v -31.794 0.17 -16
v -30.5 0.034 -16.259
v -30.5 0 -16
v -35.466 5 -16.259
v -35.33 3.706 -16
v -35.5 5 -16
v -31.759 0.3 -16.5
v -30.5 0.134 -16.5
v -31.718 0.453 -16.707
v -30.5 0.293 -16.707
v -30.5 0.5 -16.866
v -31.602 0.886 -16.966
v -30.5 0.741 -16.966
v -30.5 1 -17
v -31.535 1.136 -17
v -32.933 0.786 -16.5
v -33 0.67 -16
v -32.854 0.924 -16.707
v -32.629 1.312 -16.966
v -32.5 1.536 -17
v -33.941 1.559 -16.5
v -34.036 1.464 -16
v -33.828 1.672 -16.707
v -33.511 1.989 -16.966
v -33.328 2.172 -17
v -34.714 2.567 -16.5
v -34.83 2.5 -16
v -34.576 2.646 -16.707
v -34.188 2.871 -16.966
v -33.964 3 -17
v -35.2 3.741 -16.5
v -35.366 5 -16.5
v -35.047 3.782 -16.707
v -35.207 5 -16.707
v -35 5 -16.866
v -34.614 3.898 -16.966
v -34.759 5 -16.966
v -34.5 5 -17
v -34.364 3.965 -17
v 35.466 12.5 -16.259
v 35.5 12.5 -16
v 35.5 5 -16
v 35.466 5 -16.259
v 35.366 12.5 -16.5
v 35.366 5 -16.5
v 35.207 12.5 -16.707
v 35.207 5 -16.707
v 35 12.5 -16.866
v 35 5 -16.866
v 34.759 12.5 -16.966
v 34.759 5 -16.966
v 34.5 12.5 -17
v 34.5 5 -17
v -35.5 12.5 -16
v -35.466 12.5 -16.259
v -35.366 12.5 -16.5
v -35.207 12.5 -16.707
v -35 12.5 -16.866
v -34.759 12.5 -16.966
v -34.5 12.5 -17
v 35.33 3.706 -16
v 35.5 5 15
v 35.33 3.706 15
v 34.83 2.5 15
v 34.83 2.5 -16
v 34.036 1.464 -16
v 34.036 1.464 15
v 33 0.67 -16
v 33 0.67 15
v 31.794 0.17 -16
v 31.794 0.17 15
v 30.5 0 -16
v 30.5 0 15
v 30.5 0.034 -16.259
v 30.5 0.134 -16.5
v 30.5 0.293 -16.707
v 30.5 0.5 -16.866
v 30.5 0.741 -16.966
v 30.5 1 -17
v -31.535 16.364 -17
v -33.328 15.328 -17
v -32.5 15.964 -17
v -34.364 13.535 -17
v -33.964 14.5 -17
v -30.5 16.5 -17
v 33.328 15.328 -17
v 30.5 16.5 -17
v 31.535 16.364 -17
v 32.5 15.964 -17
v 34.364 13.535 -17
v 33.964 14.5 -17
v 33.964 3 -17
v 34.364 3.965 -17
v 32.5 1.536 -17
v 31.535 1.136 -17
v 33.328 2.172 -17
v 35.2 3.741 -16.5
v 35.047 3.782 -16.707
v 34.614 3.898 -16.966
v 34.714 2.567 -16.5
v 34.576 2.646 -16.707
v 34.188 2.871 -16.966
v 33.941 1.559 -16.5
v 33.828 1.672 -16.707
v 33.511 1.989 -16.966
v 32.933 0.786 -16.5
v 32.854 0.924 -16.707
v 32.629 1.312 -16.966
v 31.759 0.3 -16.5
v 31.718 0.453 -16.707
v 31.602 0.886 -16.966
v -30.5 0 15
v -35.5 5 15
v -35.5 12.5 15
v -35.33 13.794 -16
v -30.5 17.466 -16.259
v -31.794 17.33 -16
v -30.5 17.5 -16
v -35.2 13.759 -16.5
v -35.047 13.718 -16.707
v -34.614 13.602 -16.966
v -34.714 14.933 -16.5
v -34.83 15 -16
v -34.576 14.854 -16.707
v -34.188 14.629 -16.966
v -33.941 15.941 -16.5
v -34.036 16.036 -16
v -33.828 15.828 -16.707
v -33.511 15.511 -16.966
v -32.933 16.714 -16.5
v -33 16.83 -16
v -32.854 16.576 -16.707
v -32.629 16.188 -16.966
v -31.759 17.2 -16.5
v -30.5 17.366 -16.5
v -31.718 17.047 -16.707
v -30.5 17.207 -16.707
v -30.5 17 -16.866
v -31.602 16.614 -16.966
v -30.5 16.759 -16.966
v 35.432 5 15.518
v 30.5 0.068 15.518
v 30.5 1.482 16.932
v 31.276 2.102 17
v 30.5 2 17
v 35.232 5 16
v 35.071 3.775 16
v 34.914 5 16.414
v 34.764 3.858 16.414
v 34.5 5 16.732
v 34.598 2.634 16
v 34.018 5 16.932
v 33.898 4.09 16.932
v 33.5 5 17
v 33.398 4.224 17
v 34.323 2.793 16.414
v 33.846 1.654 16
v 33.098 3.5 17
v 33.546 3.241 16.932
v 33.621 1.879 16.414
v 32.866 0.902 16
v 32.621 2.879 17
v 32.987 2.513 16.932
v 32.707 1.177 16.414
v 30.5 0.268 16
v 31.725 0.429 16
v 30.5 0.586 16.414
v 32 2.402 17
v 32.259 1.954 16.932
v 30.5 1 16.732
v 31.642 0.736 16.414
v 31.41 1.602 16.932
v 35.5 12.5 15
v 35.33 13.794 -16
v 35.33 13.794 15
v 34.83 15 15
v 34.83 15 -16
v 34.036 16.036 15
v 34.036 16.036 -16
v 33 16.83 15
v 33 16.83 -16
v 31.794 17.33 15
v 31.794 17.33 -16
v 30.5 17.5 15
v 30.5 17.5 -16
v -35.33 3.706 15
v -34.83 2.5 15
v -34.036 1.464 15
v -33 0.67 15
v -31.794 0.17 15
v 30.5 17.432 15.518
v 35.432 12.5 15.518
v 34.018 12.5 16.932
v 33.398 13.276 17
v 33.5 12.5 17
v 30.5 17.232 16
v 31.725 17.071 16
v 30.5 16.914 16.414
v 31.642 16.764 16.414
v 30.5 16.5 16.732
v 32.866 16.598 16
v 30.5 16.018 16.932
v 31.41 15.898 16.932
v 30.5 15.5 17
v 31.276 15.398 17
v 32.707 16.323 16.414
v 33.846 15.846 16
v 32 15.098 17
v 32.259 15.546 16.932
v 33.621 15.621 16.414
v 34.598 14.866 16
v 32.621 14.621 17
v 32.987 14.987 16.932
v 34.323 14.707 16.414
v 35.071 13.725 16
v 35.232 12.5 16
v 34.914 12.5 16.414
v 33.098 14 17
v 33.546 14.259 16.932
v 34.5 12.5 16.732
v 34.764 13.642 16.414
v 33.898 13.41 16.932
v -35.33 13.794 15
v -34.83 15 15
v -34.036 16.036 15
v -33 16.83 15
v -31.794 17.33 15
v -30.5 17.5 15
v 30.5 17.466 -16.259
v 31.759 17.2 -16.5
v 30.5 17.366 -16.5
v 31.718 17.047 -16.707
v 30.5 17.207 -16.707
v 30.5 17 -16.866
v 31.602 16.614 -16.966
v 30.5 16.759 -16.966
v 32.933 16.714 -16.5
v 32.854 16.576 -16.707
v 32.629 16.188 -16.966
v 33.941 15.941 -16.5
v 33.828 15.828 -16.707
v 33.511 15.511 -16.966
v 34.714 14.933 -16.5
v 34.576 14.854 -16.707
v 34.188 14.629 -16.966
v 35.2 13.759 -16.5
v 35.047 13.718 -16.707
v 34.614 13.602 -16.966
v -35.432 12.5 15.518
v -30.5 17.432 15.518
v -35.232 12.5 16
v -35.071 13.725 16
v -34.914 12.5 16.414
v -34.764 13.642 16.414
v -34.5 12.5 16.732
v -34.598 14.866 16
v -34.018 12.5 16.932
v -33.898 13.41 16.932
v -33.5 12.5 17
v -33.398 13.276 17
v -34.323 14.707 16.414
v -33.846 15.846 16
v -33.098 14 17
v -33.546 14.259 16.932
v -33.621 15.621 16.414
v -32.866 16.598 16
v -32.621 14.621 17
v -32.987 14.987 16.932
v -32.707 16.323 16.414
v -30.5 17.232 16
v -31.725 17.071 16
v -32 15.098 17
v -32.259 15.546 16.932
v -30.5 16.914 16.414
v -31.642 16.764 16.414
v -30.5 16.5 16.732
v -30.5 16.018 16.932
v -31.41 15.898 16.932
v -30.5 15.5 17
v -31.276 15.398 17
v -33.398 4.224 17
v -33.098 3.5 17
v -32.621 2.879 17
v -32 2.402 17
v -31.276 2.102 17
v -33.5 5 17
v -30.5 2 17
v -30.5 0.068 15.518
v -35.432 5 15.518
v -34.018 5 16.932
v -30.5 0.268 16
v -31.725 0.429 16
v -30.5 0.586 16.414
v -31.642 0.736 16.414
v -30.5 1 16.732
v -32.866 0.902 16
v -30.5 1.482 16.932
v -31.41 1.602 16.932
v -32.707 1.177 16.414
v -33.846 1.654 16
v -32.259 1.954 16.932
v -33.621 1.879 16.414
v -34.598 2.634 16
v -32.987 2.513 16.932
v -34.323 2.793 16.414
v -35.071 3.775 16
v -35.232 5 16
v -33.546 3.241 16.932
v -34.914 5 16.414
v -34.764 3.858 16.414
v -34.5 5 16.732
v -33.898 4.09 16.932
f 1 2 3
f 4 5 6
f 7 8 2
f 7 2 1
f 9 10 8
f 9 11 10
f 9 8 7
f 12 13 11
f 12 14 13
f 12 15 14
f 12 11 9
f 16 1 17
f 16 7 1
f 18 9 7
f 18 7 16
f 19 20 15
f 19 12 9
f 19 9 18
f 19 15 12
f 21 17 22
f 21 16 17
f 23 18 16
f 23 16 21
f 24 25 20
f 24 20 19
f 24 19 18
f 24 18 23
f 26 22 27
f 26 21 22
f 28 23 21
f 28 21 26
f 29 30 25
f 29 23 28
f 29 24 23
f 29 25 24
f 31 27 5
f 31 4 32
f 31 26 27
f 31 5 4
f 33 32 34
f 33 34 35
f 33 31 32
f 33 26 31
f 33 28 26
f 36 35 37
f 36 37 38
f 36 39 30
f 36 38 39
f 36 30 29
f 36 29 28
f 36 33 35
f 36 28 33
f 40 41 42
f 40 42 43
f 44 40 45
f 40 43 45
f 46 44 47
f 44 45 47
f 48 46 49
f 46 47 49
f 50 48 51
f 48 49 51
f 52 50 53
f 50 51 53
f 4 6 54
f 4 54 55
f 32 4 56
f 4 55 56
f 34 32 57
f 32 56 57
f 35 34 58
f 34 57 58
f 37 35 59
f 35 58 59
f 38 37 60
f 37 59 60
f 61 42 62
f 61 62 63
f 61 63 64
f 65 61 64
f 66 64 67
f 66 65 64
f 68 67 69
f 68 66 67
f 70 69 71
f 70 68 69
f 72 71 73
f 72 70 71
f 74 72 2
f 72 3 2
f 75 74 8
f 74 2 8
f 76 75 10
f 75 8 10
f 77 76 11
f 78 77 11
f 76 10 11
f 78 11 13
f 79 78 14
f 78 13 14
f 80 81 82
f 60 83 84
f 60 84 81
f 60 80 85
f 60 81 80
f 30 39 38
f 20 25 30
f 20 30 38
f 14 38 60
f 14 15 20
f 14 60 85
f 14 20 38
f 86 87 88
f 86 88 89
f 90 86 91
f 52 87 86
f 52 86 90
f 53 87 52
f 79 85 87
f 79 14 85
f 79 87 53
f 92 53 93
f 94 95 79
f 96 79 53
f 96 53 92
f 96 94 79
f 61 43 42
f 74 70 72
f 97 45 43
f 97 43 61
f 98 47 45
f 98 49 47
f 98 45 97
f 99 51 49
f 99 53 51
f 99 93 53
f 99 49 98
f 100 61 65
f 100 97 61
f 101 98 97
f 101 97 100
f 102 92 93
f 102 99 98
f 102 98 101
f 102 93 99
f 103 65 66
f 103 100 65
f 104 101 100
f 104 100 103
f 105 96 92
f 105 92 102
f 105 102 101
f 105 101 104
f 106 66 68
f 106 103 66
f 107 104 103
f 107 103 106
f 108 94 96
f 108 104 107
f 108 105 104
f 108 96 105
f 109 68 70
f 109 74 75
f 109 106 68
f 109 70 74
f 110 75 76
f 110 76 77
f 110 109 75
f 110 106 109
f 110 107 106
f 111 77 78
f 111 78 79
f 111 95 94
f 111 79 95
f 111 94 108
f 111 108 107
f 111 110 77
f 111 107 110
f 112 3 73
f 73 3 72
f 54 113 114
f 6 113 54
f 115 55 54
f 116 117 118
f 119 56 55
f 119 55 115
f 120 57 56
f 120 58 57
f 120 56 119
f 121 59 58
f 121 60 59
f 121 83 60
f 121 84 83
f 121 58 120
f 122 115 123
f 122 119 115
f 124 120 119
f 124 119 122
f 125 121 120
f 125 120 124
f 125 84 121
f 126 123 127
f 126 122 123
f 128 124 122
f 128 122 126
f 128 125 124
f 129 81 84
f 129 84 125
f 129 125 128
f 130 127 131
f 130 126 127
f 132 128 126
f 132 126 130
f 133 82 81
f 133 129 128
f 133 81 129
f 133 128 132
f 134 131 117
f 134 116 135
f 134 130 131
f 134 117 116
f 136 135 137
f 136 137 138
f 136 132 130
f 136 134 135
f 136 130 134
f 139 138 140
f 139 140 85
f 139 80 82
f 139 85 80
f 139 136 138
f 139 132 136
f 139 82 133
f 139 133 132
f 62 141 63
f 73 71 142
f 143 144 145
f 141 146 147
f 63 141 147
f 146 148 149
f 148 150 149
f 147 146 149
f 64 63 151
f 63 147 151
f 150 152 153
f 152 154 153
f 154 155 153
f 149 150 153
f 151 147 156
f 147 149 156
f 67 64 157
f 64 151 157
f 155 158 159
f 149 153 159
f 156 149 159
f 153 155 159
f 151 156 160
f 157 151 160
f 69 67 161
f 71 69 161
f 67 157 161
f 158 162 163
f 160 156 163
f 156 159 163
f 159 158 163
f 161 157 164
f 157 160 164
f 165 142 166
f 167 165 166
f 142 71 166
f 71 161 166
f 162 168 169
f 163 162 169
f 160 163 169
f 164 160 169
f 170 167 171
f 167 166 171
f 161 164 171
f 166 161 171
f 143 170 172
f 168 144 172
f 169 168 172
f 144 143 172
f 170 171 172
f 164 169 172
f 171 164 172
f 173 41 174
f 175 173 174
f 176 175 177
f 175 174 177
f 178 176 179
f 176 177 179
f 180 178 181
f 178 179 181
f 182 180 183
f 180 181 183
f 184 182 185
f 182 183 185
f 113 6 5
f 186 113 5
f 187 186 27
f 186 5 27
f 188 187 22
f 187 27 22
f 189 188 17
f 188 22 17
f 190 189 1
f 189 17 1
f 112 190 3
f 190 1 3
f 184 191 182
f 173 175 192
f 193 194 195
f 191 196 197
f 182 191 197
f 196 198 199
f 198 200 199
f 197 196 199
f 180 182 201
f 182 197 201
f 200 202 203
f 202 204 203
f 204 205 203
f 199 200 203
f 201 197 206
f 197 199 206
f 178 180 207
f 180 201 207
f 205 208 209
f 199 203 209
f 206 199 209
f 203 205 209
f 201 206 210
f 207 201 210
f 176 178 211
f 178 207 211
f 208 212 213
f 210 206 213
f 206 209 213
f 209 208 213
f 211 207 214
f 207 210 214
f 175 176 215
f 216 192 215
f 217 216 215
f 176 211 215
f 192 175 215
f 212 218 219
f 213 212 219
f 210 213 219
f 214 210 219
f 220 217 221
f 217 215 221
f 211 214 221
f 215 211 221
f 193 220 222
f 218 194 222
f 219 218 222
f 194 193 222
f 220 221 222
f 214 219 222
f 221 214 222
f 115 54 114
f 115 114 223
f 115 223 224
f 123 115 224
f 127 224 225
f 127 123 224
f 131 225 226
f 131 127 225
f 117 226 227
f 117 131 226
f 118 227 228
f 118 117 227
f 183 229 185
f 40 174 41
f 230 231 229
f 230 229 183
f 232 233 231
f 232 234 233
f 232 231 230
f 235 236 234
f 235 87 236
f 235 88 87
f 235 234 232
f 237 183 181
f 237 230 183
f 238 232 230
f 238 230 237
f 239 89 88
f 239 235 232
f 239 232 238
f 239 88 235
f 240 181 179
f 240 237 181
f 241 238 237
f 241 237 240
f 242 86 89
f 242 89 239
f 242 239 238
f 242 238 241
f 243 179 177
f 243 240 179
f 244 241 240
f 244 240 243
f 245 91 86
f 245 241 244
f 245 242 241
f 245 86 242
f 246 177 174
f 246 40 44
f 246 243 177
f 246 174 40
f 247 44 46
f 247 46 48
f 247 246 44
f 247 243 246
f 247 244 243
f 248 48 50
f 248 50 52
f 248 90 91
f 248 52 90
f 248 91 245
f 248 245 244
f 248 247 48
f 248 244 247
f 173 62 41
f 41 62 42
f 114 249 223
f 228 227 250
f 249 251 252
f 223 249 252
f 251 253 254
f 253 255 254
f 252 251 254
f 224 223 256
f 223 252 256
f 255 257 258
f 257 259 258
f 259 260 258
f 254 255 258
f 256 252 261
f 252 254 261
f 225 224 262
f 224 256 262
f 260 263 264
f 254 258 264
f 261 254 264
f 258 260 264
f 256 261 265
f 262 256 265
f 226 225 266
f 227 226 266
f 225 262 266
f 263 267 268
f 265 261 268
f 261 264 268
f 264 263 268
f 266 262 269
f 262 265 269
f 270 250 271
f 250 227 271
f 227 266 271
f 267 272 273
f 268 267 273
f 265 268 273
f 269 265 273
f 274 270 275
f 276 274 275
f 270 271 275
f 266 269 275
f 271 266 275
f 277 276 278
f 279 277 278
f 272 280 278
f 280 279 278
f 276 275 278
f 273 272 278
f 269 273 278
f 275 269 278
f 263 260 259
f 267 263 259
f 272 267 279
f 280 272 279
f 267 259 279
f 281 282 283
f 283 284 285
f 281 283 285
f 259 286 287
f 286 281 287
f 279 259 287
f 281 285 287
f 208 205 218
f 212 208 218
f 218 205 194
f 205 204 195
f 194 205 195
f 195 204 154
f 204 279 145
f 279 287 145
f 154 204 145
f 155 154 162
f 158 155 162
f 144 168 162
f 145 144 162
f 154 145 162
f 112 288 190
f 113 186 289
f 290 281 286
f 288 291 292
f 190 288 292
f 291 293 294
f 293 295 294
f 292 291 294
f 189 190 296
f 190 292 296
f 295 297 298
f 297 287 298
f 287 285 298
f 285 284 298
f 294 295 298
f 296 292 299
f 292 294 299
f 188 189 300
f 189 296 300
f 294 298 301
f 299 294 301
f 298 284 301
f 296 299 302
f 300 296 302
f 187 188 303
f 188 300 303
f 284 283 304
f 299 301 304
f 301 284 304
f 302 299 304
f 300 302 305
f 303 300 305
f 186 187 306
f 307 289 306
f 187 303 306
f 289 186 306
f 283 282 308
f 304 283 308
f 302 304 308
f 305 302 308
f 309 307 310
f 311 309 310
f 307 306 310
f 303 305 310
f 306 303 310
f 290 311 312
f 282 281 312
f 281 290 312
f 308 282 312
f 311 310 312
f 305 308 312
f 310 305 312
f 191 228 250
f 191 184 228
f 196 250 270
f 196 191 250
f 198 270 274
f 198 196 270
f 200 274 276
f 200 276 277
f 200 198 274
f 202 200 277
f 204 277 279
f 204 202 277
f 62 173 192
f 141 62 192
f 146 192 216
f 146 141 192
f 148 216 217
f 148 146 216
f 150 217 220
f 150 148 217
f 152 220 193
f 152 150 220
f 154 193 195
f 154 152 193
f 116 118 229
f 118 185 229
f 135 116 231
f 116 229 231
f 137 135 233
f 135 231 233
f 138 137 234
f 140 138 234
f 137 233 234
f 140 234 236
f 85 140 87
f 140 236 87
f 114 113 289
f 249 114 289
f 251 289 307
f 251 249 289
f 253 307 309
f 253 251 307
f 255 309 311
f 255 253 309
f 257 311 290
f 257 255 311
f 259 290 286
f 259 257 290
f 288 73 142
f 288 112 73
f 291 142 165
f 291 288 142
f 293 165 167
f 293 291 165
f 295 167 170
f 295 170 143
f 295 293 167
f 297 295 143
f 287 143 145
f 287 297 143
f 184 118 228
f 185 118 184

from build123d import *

# Parameters (mm, degrees)
SKETCH1_W           = 71
SKETCH1_H           = 34
BOSS_EXTRUDE1_DEPTH = 17.5
FILLET1_R           = 5
FILLET2_R           = 2
FILLET3_R           = 1


with BuildPart() as part:
    # Sketch1 → Boss-Extrude1 (new body)
    with BuildSketch(Plane(origin=(0, 0, 0), x_dir=(1, 0, 0), z_dir=(0, 1, 0))):
        Rectangle(SKETCH1_W, SKETCH1_H)
    extrude(amount=BOSS_EXTRUDE1_DEPTH)

    # Fillet1
    fillet1_edges = [part.edges().sort_by_distance(p)[0] for p in [
        (35.5, 17.5, 0),
        (-35.5, 17.5, 0),
        (35.5, 0, 0),
        (-35.5, 0, 0),
    ]]
    fillet(fillet1_edges, radius=FILLET1_R)

    # Fillet2
    fillet2_edges = [part.edges().sort_by_distance(p)[0] for p in [
        (-35.5, 8.75, 17),
        (0, 0, 17),
        (35.5, 8.75, 17),
        (0, 17.5, 17),
        (-34.035533906, 16.035533906, 17),
        (34.035533906, 16.035533906, 17),
        (34.035533906, 1.464466094, 17),
        (-34.035533906, 1.464466094, 17),
    ]]
    fillet(fillet2_edges, radius=FILLET2_R)

    # Fillet3
    fillet3_edges = [part.edges().sort_by_distance(p)[0] for p in [
        (-35.5, 8.75, -17),
        (0, 0, -17),
        (0, 17.5, -17),
        (35.5, 8.75, -17),
        (-34.035533906, 16.035533906, -17),
        (34.035533906, 16.035533906, -17),
        (34.035533906, 1.464466094, -17),
        (-34.035533906, 1.464466094, -17),
    ]]
    fillet(fillet3_edges, radius=FILLET3_R)


solid = part.part
